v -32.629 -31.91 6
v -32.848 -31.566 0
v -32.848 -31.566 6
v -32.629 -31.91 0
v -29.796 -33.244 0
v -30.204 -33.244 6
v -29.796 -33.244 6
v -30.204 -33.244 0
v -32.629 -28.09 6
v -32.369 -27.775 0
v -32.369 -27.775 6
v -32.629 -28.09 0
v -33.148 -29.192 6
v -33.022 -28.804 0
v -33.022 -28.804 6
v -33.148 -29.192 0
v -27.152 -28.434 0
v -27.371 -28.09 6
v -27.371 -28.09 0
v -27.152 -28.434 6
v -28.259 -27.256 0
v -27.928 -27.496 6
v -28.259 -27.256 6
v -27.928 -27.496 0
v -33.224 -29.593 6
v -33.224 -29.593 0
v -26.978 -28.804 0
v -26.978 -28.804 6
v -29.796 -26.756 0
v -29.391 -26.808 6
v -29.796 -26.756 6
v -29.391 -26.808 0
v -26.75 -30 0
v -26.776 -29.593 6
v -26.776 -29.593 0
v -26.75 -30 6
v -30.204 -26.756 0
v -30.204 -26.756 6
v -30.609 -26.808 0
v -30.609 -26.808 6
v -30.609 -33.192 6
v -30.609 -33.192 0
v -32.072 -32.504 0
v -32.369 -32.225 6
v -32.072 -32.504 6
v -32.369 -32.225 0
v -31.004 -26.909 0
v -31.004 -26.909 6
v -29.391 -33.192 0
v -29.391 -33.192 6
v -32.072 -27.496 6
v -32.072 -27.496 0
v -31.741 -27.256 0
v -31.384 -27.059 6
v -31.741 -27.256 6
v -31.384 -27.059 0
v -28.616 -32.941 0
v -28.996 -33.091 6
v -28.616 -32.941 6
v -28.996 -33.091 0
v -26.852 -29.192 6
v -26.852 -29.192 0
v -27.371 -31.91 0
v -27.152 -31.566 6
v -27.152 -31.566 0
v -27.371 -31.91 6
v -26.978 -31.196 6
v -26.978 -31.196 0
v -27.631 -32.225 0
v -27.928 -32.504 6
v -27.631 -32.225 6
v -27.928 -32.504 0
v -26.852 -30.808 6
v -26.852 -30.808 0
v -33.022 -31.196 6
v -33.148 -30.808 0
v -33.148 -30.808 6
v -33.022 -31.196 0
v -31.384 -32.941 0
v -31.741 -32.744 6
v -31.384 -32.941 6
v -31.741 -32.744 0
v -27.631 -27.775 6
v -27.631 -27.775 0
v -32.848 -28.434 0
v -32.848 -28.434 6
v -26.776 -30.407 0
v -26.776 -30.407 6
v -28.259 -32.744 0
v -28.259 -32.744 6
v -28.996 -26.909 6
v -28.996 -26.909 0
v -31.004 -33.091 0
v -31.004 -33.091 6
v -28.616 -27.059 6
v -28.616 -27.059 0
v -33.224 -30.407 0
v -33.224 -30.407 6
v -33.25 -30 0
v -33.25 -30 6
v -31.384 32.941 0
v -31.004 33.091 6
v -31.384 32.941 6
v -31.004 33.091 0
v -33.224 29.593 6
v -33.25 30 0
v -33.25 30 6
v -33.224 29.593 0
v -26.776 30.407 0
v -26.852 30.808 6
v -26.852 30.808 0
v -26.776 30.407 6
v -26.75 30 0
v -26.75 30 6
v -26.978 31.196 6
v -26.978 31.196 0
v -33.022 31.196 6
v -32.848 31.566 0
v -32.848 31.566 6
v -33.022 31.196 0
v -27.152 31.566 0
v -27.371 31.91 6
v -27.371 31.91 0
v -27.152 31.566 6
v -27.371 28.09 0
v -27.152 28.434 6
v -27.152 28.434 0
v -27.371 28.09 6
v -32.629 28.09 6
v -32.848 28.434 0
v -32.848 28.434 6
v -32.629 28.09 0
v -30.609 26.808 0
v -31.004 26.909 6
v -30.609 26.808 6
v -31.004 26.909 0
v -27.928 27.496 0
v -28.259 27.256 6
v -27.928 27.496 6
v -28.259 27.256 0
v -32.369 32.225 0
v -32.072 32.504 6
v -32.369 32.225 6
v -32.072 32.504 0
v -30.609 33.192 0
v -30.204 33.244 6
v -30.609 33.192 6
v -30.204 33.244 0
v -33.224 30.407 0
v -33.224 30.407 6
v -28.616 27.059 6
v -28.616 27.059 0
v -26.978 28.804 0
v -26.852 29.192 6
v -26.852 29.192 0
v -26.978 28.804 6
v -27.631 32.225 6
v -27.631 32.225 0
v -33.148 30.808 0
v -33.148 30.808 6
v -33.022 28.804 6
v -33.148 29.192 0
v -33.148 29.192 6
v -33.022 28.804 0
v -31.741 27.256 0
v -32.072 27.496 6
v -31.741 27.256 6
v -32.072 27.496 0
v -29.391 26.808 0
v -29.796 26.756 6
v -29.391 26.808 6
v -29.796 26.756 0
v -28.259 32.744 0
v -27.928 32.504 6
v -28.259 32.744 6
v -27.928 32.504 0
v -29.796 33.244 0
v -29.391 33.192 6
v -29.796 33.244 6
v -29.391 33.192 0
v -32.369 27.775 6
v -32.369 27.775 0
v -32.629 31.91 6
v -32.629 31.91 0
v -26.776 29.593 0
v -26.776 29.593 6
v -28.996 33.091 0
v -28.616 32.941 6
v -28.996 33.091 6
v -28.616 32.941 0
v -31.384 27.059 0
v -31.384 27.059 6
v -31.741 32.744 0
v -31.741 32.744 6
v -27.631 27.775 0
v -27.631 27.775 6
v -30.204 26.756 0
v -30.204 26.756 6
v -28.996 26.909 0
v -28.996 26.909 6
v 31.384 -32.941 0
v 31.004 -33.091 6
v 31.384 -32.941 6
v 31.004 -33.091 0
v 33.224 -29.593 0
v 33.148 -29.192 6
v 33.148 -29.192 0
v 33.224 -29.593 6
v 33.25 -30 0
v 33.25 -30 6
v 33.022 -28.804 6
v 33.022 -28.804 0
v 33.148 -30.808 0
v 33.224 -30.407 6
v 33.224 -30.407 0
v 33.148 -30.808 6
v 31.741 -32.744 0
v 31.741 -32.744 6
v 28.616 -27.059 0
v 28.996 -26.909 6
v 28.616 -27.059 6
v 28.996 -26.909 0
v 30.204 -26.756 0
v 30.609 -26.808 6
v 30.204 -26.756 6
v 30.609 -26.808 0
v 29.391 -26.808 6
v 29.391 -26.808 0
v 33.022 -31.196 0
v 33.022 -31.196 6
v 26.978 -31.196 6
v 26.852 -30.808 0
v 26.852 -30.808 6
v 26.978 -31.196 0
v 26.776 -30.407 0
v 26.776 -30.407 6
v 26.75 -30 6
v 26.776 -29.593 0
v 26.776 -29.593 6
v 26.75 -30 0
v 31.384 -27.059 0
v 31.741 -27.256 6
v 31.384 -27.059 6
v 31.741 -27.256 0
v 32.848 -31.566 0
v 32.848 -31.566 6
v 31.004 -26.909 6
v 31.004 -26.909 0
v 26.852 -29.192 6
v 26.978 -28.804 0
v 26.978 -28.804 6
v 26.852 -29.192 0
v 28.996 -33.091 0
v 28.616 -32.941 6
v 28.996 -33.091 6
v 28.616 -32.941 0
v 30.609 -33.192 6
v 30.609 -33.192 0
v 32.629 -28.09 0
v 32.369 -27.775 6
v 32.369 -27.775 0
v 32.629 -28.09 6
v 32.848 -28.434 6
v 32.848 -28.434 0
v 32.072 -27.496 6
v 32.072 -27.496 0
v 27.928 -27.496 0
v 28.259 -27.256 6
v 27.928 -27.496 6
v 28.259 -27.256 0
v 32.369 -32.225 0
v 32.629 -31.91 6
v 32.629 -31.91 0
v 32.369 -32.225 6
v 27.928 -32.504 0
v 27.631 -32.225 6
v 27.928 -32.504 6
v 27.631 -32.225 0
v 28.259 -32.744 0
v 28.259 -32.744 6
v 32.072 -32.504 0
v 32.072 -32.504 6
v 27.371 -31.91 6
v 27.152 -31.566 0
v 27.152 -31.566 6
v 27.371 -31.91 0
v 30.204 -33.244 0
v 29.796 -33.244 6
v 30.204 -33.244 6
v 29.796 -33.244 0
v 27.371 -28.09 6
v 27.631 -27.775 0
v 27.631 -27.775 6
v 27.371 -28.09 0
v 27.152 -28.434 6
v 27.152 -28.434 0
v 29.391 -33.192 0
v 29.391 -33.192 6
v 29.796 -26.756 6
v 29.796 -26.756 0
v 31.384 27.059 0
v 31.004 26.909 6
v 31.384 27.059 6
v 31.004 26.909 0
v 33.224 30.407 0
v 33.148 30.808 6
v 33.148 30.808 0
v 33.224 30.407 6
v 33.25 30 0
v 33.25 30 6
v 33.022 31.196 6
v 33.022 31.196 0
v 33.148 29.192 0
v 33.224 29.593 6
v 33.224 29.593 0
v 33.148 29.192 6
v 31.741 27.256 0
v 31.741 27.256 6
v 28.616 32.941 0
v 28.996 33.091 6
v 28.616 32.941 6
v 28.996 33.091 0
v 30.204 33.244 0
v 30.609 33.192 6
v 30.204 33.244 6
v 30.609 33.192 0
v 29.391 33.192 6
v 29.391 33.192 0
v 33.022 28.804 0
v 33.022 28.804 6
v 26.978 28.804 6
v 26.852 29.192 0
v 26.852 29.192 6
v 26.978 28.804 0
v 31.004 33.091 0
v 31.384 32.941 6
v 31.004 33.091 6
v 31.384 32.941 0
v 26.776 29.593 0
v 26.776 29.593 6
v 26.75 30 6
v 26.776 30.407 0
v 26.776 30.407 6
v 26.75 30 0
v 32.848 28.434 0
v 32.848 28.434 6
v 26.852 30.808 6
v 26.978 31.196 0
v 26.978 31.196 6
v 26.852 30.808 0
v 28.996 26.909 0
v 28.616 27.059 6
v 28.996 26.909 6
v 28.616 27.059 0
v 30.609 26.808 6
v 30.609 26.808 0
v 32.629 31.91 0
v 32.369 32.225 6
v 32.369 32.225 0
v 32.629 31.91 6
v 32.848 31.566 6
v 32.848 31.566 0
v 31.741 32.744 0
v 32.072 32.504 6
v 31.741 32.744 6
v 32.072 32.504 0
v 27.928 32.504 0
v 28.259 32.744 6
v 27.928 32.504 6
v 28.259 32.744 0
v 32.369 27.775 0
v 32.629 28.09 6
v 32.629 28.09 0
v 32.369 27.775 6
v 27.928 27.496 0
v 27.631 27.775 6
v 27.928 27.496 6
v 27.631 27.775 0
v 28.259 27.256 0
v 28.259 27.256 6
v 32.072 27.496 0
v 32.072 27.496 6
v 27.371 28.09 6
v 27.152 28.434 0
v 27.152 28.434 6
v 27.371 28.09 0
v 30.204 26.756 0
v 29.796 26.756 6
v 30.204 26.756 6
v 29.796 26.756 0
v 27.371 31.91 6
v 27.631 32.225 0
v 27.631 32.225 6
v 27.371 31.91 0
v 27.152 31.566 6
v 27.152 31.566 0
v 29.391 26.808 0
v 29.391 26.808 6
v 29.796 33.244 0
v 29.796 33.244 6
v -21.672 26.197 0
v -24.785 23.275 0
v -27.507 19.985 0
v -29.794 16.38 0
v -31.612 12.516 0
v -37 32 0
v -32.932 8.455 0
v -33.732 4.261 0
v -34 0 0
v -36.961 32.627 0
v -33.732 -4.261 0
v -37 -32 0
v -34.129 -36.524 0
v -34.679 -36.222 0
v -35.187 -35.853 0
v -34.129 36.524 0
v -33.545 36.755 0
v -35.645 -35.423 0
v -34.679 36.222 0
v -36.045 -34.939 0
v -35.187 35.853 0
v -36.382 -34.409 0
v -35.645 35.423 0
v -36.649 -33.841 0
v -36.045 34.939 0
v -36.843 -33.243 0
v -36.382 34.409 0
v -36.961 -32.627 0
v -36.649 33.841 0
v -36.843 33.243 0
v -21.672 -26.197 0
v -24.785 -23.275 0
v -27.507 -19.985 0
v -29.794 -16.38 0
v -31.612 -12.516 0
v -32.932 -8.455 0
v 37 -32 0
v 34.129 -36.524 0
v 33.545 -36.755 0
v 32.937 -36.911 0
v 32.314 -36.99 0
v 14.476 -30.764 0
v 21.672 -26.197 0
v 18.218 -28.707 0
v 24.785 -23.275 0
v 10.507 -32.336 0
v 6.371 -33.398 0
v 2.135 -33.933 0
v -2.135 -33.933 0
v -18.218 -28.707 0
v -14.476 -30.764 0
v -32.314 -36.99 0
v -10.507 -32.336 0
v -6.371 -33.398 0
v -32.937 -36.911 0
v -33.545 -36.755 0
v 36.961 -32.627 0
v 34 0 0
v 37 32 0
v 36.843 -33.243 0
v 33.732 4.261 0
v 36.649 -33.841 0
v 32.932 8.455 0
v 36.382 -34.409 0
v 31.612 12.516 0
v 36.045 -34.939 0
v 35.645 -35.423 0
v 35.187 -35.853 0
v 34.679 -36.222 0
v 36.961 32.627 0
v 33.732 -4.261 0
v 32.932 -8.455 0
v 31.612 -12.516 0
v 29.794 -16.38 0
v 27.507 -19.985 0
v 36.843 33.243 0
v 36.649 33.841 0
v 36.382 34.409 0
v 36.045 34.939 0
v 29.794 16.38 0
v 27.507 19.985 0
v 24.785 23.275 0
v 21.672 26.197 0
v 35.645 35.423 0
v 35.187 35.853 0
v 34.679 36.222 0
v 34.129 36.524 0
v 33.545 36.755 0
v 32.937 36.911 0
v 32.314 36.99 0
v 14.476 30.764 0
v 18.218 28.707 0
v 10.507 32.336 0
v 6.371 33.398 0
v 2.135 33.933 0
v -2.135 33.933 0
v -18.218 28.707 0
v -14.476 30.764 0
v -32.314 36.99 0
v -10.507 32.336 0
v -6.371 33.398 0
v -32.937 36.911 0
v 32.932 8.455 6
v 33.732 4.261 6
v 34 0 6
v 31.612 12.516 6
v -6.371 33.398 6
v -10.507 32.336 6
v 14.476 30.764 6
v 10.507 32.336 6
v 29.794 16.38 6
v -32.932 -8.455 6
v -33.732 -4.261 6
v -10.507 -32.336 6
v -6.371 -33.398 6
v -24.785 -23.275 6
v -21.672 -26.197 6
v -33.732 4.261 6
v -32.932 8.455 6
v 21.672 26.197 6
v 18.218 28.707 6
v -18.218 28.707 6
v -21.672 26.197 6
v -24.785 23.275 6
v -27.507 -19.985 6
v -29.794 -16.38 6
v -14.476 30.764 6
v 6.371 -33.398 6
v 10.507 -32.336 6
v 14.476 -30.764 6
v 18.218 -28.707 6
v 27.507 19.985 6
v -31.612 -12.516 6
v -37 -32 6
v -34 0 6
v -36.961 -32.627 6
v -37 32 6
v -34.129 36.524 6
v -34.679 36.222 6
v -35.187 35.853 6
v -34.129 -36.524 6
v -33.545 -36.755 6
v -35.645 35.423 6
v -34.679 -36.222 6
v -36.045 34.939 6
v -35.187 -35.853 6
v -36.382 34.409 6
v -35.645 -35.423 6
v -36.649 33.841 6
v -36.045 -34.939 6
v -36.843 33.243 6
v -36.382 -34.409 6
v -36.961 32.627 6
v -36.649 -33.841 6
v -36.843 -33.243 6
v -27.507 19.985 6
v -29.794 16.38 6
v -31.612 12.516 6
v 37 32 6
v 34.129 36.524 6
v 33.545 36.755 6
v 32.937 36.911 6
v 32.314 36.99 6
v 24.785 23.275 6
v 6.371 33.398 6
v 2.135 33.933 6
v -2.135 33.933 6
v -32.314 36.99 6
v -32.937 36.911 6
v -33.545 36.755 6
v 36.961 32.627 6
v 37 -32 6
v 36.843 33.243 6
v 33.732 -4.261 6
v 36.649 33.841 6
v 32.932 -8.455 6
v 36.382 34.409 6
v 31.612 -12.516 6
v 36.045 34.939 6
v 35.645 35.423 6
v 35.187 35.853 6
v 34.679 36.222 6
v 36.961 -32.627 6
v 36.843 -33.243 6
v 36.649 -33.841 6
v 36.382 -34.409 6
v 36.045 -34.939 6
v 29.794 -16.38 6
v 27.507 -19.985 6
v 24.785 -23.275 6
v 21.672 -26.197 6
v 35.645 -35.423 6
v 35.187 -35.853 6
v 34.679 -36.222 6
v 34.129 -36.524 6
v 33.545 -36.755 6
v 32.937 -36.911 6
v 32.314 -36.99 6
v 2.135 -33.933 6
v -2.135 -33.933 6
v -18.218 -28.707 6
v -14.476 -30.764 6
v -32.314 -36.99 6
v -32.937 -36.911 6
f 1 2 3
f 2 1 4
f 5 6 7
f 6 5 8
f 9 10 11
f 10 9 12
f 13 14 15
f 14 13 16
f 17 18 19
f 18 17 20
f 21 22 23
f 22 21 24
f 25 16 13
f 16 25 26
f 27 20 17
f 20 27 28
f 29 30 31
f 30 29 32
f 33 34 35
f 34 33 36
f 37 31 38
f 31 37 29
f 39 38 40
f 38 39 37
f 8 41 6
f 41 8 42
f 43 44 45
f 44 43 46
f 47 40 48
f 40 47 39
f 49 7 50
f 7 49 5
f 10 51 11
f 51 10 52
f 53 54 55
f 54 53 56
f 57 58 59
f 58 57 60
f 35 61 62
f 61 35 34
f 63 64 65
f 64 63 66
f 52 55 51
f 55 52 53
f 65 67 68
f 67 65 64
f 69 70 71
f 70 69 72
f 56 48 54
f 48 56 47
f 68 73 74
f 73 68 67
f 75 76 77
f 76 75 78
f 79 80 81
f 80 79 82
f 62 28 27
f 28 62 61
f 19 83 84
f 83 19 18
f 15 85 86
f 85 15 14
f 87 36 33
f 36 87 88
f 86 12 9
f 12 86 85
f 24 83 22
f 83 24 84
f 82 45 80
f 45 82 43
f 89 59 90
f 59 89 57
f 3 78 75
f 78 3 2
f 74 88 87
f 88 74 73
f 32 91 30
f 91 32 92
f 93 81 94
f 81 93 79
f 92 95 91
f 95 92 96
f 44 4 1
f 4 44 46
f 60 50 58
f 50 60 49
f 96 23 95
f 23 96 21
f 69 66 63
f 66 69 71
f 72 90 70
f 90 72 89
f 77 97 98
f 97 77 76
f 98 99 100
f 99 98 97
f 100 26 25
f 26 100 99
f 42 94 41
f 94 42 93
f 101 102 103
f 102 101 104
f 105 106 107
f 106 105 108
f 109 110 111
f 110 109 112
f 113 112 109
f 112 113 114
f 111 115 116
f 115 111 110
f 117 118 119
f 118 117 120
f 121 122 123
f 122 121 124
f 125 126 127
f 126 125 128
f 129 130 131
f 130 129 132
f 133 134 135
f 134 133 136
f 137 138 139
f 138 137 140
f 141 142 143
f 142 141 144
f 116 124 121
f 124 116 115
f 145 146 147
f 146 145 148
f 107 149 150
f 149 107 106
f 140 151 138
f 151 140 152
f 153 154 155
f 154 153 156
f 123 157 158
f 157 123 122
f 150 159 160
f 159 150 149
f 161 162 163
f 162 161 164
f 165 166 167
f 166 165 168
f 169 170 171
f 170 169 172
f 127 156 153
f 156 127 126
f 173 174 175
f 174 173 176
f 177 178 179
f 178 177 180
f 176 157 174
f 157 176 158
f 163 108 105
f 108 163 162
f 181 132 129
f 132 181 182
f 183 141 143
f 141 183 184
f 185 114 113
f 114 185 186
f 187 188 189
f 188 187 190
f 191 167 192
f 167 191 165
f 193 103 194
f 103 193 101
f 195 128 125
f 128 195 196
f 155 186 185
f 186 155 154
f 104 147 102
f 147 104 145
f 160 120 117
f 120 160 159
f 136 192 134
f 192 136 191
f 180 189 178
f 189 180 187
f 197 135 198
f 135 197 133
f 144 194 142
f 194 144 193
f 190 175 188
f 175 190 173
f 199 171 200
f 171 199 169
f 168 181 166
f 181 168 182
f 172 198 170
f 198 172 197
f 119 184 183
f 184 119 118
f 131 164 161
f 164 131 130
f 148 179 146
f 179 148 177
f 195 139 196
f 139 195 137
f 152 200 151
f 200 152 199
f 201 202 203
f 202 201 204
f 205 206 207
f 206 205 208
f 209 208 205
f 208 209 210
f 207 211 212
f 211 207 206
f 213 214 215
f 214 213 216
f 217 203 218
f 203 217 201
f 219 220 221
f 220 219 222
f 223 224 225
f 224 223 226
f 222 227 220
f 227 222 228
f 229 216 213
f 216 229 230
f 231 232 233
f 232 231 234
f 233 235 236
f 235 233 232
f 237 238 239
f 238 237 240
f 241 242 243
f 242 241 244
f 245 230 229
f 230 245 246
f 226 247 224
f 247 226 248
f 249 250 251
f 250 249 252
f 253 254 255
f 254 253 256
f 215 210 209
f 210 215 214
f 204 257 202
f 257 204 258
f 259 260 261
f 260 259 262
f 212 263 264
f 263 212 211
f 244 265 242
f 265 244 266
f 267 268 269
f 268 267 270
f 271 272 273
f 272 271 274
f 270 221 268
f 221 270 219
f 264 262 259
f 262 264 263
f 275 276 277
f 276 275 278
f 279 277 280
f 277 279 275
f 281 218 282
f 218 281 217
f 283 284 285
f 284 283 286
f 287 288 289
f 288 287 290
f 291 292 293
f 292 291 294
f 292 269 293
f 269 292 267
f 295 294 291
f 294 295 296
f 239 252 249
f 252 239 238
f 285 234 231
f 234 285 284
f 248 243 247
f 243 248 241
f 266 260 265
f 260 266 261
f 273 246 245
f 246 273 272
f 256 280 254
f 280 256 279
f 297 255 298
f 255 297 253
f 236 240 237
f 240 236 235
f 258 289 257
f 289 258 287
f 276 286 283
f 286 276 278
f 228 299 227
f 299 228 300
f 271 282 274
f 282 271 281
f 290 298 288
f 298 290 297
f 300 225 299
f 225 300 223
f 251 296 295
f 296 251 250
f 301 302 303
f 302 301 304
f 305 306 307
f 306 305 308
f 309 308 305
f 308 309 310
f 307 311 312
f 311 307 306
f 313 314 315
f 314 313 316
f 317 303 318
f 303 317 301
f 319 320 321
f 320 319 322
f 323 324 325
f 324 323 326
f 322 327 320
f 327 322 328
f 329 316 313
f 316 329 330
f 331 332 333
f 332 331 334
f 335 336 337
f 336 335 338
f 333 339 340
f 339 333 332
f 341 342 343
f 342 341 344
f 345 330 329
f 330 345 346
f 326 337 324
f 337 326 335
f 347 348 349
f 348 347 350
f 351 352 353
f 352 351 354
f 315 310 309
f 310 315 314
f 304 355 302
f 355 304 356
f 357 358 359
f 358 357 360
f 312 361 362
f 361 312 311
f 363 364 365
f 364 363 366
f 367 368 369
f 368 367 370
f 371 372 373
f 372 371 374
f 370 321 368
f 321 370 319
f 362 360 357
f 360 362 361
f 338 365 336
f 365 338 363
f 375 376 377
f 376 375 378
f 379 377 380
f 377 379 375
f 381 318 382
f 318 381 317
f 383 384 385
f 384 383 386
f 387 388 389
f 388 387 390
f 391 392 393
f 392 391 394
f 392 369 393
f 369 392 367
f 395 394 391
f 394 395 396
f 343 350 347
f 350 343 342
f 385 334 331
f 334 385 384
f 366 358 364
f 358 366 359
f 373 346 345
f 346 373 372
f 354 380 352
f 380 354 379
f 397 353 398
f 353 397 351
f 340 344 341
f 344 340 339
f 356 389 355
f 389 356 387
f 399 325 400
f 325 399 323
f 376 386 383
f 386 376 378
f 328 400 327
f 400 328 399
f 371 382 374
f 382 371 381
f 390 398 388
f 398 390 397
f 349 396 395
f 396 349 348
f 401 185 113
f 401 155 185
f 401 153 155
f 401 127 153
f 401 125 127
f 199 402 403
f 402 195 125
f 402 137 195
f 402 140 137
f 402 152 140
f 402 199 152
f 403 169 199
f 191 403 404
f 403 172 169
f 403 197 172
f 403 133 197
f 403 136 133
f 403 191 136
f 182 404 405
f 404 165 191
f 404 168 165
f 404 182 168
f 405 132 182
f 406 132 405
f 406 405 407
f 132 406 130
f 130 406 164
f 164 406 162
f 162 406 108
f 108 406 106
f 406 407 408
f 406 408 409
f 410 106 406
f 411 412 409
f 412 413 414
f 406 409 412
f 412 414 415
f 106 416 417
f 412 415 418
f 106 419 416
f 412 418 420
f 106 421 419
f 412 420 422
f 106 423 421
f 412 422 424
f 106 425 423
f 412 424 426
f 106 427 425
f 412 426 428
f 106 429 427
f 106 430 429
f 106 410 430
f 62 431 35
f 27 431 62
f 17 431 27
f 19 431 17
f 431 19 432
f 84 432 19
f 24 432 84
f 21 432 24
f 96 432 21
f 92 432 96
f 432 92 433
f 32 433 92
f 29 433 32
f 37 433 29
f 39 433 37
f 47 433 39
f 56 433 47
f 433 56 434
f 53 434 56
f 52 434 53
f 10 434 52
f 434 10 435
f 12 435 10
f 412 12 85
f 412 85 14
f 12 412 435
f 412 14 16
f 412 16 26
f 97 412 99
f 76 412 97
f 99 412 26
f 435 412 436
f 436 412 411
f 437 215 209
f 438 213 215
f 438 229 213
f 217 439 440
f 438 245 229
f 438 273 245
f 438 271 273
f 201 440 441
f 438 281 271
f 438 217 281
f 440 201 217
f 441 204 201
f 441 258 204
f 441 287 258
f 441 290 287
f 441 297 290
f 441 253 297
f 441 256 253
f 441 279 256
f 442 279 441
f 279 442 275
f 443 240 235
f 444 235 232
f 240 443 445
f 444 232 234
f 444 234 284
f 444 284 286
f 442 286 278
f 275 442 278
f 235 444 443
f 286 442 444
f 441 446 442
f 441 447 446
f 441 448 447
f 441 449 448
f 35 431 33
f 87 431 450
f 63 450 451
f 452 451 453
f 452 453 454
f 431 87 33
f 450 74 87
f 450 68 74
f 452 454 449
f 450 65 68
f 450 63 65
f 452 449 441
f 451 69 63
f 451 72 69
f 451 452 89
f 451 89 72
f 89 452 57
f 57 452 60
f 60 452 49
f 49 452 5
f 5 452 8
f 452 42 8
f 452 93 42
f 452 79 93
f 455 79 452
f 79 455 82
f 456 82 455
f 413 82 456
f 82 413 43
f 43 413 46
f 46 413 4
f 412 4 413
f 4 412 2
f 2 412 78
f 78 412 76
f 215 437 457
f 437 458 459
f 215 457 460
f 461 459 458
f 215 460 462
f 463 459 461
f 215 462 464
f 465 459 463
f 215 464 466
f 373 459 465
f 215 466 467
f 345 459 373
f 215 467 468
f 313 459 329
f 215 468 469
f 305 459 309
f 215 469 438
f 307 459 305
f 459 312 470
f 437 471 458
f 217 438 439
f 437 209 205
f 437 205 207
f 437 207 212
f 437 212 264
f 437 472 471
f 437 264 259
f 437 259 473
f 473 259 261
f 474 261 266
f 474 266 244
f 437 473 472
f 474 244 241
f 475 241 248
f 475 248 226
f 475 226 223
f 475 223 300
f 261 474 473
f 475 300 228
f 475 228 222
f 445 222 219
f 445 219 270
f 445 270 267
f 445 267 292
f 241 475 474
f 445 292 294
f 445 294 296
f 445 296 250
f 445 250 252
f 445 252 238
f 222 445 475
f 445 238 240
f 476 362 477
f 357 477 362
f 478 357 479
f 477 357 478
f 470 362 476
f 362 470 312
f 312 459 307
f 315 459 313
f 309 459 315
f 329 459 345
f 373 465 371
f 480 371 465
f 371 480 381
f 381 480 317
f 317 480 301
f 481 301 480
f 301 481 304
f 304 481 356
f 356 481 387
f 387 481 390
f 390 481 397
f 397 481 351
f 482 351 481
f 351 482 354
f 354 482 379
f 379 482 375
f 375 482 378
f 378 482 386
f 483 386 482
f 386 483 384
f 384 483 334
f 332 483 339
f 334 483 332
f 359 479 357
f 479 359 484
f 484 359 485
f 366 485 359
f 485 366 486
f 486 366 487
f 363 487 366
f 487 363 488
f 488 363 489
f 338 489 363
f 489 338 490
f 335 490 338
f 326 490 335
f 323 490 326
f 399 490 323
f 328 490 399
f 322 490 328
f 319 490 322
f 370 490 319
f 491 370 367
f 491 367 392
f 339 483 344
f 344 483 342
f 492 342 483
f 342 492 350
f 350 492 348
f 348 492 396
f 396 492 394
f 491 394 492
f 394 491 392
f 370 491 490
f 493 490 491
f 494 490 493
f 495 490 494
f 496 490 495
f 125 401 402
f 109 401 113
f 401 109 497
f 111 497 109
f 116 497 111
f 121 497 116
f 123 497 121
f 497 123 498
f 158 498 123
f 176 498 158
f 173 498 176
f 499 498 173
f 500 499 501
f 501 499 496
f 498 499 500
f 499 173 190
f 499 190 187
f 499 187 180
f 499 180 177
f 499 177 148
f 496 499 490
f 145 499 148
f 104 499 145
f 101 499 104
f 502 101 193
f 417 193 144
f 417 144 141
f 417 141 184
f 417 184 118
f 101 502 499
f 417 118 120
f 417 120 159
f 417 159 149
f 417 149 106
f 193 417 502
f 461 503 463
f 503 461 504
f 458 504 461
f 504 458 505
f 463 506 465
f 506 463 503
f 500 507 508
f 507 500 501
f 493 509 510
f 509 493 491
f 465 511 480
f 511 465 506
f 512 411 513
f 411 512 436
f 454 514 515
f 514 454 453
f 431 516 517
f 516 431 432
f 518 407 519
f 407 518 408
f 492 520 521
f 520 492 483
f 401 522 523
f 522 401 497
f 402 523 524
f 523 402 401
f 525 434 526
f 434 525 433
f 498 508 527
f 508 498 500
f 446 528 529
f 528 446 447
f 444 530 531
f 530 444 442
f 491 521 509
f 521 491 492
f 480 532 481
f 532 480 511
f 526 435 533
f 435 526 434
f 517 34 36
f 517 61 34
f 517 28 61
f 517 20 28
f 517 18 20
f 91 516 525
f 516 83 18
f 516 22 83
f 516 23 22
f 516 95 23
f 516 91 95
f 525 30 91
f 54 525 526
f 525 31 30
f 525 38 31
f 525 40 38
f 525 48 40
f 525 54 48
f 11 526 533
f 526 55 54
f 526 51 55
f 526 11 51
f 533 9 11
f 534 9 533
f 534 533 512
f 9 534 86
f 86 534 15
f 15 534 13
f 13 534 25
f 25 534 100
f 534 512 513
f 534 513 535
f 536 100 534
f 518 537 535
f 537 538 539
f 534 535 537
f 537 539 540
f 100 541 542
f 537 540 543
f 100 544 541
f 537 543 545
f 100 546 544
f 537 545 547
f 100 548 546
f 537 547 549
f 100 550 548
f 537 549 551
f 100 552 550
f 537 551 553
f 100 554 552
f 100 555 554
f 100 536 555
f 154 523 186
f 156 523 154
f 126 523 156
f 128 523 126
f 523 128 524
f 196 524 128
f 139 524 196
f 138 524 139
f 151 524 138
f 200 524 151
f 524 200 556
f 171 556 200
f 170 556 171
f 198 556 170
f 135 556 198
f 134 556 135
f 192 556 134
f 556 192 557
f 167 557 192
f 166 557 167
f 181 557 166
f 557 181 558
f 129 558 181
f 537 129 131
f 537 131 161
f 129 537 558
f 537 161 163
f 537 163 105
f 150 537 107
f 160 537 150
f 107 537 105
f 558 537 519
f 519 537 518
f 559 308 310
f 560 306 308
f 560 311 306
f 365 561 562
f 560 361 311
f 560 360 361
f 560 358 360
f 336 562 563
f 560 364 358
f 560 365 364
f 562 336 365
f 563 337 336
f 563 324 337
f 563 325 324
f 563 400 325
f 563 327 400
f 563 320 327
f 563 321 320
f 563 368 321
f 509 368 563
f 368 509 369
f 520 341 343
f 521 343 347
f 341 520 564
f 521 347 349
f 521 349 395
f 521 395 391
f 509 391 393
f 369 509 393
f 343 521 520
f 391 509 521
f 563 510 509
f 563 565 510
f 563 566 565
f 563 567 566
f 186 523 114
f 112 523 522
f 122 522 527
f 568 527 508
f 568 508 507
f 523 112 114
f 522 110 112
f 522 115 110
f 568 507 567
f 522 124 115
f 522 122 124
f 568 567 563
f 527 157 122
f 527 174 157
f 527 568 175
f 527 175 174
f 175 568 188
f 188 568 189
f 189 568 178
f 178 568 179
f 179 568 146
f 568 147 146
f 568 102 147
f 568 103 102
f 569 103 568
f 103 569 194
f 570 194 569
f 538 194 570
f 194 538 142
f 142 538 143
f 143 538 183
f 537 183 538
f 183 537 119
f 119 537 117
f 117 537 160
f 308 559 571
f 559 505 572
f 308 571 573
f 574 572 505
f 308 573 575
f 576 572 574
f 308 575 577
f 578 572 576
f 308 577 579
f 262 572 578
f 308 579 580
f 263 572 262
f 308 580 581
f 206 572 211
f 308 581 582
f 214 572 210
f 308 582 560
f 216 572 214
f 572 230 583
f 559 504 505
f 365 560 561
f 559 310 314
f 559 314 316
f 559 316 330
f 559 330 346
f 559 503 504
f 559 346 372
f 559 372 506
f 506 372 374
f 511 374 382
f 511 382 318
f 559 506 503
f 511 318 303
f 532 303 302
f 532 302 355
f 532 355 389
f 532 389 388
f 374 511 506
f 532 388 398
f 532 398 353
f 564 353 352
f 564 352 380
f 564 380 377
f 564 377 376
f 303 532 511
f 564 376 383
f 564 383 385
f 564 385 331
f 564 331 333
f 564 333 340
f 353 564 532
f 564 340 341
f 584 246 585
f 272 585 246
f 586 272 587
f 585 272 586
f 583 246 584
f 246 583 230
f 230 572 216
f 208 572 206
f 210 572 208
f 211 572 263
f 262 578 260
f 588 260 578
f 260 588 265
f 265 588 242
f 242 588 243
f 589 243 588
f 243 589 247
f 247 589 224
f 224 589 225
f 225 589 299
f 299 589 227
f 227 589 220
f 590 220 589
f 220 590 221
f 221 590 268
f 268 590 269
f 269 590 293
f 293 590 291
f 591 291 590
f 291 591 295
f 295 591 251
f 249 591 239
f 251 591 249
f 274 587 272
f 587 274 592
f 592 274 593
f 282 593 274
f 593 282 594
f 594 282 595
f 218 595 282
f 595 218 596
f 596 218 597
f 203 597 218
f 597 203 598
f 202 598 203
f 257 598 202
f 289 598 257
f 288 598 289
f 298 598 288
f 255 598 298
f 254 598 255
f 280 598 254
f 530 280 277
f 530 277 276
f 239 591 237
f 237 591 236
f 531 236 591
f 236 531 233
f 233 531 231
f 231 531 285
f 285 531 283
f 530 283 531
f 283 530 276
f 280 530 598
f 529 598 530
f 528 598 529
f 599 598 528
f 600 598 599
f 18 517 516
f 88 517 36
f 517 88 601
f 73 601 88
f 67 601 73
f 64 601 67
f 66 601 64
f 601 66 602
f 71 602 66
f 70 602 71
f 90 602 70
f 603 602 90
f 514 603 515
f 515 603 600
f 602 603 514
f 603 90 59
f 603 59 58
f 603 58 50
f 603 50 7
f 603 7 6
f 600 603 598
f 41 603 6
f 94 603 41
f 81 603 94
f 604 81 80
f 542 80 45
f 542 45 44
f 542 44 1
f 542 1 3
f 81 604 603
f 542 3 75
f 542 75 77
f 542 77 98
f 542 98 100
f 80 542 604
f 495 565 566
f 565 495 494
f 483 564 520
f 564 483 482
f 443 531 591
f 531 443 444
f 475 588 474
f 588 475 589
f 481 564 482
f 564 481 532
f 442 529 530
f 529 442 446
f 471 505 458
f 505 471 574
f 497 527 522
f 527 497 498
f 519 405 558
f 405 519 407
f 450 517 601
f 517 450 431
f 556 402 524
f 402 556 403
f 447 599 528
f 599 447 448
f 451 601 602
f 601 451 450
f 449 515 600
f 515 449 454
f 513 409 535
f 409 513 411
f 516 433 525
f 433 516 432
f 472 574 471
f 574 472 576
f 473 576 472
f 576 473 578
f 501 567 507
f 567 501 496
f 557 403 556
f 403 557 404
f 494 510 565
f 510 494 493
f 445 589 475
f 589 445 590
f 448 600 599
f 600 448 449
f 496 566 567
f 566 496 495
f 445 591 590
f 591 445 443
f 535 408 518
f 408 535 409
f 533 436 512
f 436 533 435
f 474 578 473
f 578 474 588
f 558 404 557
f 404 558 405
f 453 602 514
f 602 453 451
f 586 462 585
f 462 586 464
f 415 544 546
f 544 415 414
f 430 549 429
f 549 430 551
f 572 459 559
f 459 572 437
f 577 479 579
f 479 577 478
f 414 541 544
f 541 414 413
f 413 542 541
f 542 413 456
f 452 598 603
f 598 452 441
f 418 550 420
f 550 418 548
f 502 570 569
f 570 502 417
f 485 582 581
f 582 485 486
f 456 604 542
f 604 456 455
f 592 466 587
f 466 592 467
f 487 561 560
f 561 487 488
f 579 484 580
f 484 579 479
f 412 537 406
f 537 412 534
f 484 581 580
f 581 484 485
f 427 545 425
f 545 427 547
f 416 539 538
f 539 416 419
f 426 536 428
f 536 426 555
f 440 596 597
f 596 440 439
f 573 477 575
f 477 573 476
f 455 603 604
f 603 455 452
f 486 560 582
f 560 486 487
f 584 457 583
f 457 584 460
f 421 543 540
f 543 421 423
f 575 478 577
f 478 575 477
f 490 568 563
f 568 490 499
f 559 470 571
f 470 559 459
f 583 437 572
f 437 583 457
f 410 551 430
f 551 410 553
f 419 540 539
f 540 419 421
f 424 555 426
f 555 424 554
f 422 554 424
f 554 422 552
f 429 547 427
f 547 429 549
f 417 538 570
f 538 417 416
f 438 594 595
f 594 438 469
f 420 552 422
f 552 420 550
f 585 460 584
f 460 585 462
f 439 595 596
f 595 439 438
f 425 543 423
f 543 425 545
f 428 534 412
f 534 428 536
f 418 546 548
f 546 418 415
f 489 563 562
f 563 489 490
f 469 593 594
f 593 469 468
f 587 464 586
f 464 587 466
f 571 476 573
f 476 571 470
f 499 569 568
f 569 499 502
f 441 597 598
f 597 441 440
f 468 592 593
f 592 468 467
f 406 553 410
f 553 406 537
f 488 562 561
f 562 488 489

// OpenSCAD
$fn = 50;


difference() {
	union() {
		hull() {
			translate(v = [-32.0000000000, 32.0000000000, 0]) {
				cylinder(h = 6, r = 5);
			}
			translate(v = [32.0000000000, 32.0000000000, 0]) {
				cylinder(h = 6, r = 5);
			}
			translate(v = [-32.0000000000, -32.0000000000, 0]) {
				cylinder(h = 6, r = 5);
			}
			translate(v = [32.0000000000, -32.0000000000, 0]) {
				cylinder(h = 6, r = 5);
			}
		}
	}
	union() {
		#translate(v = [-30.0000000000, -30.0000000000, -100.0000000000]) {
			cylinder(h = 200, r = 3.2500000000);
		}
		#translate(v = [-30.0000000000, 30.0000000000, -100.0000000000]) {
			cylinder(h = 200, r = 3.2500000000);
		}
		#translate(v = [30.0000000000, -30.0000000000, -100.0000000000]) {
			cylinder(h = 200, r = 3.2500000000);
		}
		#translate(v = [30.0000000000, 30.0000000000, -100.0000000000]) {
			cylinder(h = 200, r = 3.2500000000);
		}
		#cylinder(h = 6, r = 34.0000000000);
	}
}
